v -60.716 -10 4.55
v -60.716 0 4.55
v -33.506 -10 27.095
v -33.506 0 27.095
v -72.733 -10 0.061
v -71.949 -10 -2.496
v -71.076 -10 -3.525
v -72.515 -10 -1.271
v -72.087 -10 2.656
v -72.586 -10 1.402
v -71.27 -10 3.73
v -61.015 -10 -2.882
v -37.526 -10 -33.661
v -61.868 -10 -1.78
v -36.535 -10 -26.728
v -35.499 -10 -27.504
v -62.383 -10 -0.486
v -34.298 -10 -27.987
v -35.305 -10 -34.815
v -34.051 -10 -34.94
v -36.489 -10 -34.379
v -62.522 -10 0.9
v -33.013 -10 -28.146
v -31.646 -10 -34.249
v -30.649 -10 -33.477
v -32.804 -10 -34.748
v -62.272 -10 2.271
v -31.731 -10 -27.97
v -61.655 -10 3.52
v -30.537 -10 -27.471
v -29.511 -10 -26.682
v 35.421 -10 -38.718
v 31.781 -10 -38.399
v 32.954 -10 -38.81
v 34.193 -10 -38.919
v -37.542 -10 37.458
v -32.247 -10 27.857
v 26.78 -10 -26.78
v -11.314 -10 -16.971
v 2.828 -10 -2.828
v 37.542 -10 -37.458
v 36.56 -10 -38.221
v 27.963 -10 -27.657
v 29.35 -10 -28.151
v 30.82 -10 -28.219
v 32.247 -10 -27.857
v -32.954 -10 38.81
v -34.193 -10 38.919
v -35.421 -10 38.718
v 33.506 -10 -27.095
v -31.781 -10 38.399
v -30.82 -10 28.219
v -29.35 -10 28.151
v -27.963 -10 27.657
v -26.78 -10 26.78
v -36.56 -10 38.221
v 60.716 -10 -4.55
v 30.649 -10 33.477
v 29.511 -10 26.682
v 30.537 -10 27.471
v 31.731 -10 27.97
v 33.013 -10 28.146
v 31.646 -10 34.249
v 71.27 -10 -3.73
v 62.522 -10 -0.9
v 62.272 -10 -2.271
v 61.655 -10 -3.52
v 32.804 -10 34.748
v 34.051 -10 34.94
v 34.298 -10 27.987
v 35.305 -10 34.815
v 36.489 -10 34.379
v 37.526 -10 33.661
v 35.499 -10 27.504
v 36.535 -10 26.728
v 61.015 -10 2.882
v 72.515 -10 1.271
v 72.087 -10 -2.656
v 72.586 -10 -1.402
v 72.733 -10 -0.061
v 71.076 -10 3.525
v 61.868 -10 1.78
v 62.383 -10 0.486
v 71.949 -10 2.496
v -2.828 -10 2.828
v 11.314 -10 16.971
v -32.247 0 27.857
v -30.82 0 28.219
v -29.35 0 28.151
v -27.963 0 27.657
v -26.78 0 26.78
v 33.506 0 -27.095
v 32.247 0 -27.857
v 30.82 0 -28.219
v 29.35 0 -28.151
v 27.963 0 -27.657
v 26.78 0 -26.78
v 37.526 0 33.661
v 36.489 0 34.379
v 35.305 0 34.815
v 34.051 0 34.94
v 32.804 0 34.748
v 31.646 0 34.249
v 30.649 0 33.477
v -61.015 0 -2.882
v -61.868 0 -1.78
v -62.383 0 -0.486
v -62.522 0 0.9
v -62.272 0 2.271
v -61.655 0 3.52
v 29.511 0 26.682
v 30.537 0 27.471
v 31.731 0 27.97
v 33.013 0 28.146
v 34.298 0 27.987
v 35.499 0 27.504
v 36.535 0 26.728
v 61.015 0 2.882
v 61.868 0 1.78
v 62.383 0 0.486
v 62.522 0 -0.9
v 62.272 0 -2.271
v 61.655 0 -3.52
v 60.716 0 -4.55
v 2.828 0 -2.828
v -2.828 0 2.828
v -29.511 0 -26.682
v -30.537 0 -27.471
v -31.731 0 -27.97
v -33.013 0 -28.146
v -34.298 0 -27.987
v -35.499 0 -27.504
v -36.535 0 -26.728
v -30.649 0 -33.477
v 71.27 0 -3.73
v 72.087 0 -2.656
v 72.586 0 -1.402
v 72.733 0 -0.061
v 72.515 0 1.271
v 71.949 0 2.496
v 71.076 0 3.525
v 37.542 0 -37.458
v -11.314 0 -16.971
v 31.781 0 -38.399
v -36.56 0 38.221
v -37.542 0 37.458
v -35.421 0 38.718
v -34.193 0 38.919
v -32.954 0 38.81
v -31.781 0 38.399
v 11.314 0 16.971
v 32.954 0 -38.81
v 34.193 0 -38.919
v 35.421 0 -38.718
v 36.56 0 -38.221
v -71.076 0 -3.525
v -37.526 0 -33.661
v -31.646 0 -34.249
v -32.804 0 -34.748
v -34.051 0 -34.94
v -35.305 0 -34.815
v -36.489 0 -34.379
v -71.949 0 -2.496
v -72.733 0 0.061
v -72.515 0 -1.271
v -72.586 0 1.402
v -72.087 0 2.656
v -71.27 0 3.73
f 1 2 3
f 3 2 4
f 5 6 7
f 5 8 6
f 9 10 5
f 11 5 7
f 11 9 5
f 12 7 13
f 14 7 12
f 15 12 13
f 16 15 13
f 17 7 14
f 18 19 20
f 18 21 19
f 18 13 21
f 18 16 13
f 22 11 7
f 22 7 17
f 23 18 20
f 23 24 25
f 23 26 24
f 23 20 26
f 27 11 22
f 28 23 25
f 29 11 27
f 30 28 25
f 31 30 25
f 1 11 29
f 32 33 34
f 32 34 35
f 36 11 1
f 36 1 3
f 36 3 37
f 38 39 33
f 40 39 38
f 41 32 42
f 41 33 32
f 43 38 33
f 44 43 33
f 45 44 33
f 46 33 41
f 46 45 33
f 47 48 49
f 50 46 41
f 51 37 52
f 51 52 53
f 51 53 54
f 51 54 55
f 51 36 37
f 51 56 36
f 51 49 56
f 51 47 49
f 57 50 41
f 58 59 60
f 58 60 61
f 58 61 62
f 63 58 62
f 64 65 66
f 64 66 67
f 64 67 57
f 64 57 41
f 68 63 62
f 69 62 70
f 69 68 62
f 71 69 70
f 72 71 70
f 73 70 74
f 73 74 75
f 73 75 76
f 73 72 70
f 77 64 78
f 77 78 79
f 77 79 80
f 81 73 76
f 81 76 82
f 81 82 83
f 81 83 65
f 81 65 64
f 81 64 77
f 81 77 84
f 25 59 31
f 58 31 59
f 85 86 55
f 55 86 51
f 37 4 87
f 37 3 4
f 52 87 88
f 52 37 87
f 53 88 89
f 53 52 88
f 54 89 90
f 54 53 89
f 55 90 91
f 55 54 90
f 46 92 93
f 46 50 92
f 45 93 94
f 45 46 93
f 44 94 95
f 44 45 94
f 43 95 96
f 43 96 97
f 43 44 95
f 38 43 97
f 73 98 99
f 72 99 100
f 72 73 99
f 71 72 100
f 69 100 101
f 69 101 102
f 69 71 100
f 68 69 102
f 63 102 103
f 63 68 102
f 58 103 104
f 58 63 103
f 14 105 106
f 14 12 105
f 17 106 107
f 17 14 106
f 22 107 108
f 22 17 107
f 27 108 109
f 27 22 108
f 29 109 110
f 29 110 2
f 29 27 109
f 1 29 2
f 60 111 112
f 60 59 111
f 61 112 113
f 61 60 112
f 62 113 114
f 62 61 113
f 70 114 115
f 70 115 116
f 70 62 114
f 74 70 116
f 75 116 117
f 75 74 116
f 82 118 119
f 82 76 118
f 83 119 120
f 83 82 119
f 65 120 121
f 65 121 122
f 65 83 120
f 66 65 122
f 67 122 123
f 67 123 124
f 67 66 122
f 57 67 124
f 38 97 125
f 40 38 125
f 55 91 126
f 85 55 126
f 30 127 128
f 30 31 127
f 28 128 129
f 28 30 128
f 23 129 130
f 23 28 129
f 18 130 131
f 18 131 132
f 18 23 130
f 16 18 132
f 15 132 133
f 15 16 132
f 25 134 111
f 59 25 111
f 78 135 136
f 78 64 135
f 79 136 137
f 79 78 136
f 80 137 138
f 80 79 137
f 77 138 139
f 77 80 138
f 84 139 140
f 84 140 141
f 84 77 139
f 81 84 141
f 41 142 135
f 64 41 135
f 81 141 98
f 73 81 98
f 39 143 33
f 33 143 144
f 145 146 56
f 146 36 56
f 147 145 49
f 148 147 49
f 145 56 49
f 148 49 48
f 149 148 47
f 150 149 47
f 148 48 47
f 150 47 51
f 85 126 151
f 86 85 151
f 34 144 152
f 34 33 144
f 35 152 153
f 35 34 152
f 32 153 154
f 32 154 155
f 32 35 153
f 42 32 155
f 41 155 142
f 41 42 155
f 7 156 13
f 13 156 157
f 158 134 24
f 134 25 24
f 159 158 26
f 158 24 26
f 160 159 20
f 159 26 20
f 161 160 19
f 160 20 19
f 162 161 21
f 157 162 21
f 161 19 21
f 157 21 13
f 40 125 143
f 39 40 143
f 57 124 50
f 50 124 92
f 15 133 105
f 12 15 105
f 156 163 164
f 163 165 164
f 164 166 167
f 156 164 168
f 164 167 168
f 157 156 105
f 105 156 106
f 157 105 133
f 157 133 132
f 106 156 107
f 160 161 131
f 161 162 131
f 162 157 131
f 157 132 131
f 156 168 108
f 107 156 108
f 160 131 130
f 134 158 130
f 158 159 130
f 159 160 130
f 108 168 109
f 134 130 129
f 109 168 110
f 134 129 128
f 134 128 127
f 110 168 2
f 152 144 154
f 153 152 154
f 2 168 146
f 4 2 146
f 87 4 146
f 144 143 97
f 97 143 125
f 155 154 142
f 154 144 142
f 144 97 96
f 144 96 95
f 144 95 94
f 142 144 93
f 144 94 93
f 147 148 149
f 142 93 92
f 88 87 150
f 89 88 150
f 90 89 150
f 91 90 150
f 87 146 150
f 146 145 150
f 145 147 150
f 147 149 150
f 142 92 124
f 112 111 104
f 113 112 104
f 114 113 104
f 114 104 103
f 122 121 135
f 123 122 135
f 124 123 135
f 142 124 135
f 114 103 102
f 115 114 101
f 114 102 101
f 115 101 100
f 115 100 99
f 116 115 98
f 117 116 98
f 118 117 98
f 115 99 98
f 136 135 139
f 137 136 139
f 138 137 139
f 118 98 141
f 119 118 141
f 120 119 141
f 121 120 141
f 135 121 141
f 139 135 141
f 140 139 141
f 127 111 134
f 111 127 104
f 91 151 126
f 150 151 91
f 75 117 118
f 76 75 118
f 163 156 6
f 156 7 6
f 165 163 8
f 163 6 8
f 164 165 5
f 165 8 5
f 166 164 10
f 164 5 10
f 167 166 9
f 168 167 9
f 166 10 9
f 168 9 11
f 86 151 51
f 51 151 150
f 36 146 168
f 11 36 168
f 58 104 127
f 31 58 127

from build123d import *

# Parameters (mm, degrees)
F1_DEPTH = 10
F2_R     = 5
F3_R     = 5


with BuildPart() as f1:
    # F0 (on Front) → F1 (new body)
    with BuildSketch(Plane.XZ):
        Polygon((-75, 0), (-34, -36.828427), (33, 30.171573), (65, -1), (30, -30), (2.828427, -2.828427), (-11.313708, -16.970563), (35, -40), (75, 0), (34, 36.828427), (-33, -30.171573), (-65, 1), (-30, 30), (-2.828427, 2.828427), (11.313708, 16.970563), (-35, 40), align=None)
    extrude(amount=F1_DEPTH)

    # F2
    f2_edges = [f1.edges().sort_by_distance(p)[0] for p in [
        (-30, -5, 30),
        (-65, -5, 1),
        (-33, -5, -30.171573),
        (33, -5, 30.171573),
        (65, -5, -1),
        (30, -5, -30),
    ]]
    fillet(f2_edges, radius=F2_R)

    # F3
    f3_edges = [f1.edges().sort_by_distance(p)[0] for p in [
        (-35, -5, 40),
        (-75, -5, 0),
        (-34, -5, -36.828427),
        (35, -5, -40),
        (75, -5, 0),
        (34, -5, 36.828427),
    ]]
    fillet(f3_edges, radius=F3_R)


solid = f1.part
